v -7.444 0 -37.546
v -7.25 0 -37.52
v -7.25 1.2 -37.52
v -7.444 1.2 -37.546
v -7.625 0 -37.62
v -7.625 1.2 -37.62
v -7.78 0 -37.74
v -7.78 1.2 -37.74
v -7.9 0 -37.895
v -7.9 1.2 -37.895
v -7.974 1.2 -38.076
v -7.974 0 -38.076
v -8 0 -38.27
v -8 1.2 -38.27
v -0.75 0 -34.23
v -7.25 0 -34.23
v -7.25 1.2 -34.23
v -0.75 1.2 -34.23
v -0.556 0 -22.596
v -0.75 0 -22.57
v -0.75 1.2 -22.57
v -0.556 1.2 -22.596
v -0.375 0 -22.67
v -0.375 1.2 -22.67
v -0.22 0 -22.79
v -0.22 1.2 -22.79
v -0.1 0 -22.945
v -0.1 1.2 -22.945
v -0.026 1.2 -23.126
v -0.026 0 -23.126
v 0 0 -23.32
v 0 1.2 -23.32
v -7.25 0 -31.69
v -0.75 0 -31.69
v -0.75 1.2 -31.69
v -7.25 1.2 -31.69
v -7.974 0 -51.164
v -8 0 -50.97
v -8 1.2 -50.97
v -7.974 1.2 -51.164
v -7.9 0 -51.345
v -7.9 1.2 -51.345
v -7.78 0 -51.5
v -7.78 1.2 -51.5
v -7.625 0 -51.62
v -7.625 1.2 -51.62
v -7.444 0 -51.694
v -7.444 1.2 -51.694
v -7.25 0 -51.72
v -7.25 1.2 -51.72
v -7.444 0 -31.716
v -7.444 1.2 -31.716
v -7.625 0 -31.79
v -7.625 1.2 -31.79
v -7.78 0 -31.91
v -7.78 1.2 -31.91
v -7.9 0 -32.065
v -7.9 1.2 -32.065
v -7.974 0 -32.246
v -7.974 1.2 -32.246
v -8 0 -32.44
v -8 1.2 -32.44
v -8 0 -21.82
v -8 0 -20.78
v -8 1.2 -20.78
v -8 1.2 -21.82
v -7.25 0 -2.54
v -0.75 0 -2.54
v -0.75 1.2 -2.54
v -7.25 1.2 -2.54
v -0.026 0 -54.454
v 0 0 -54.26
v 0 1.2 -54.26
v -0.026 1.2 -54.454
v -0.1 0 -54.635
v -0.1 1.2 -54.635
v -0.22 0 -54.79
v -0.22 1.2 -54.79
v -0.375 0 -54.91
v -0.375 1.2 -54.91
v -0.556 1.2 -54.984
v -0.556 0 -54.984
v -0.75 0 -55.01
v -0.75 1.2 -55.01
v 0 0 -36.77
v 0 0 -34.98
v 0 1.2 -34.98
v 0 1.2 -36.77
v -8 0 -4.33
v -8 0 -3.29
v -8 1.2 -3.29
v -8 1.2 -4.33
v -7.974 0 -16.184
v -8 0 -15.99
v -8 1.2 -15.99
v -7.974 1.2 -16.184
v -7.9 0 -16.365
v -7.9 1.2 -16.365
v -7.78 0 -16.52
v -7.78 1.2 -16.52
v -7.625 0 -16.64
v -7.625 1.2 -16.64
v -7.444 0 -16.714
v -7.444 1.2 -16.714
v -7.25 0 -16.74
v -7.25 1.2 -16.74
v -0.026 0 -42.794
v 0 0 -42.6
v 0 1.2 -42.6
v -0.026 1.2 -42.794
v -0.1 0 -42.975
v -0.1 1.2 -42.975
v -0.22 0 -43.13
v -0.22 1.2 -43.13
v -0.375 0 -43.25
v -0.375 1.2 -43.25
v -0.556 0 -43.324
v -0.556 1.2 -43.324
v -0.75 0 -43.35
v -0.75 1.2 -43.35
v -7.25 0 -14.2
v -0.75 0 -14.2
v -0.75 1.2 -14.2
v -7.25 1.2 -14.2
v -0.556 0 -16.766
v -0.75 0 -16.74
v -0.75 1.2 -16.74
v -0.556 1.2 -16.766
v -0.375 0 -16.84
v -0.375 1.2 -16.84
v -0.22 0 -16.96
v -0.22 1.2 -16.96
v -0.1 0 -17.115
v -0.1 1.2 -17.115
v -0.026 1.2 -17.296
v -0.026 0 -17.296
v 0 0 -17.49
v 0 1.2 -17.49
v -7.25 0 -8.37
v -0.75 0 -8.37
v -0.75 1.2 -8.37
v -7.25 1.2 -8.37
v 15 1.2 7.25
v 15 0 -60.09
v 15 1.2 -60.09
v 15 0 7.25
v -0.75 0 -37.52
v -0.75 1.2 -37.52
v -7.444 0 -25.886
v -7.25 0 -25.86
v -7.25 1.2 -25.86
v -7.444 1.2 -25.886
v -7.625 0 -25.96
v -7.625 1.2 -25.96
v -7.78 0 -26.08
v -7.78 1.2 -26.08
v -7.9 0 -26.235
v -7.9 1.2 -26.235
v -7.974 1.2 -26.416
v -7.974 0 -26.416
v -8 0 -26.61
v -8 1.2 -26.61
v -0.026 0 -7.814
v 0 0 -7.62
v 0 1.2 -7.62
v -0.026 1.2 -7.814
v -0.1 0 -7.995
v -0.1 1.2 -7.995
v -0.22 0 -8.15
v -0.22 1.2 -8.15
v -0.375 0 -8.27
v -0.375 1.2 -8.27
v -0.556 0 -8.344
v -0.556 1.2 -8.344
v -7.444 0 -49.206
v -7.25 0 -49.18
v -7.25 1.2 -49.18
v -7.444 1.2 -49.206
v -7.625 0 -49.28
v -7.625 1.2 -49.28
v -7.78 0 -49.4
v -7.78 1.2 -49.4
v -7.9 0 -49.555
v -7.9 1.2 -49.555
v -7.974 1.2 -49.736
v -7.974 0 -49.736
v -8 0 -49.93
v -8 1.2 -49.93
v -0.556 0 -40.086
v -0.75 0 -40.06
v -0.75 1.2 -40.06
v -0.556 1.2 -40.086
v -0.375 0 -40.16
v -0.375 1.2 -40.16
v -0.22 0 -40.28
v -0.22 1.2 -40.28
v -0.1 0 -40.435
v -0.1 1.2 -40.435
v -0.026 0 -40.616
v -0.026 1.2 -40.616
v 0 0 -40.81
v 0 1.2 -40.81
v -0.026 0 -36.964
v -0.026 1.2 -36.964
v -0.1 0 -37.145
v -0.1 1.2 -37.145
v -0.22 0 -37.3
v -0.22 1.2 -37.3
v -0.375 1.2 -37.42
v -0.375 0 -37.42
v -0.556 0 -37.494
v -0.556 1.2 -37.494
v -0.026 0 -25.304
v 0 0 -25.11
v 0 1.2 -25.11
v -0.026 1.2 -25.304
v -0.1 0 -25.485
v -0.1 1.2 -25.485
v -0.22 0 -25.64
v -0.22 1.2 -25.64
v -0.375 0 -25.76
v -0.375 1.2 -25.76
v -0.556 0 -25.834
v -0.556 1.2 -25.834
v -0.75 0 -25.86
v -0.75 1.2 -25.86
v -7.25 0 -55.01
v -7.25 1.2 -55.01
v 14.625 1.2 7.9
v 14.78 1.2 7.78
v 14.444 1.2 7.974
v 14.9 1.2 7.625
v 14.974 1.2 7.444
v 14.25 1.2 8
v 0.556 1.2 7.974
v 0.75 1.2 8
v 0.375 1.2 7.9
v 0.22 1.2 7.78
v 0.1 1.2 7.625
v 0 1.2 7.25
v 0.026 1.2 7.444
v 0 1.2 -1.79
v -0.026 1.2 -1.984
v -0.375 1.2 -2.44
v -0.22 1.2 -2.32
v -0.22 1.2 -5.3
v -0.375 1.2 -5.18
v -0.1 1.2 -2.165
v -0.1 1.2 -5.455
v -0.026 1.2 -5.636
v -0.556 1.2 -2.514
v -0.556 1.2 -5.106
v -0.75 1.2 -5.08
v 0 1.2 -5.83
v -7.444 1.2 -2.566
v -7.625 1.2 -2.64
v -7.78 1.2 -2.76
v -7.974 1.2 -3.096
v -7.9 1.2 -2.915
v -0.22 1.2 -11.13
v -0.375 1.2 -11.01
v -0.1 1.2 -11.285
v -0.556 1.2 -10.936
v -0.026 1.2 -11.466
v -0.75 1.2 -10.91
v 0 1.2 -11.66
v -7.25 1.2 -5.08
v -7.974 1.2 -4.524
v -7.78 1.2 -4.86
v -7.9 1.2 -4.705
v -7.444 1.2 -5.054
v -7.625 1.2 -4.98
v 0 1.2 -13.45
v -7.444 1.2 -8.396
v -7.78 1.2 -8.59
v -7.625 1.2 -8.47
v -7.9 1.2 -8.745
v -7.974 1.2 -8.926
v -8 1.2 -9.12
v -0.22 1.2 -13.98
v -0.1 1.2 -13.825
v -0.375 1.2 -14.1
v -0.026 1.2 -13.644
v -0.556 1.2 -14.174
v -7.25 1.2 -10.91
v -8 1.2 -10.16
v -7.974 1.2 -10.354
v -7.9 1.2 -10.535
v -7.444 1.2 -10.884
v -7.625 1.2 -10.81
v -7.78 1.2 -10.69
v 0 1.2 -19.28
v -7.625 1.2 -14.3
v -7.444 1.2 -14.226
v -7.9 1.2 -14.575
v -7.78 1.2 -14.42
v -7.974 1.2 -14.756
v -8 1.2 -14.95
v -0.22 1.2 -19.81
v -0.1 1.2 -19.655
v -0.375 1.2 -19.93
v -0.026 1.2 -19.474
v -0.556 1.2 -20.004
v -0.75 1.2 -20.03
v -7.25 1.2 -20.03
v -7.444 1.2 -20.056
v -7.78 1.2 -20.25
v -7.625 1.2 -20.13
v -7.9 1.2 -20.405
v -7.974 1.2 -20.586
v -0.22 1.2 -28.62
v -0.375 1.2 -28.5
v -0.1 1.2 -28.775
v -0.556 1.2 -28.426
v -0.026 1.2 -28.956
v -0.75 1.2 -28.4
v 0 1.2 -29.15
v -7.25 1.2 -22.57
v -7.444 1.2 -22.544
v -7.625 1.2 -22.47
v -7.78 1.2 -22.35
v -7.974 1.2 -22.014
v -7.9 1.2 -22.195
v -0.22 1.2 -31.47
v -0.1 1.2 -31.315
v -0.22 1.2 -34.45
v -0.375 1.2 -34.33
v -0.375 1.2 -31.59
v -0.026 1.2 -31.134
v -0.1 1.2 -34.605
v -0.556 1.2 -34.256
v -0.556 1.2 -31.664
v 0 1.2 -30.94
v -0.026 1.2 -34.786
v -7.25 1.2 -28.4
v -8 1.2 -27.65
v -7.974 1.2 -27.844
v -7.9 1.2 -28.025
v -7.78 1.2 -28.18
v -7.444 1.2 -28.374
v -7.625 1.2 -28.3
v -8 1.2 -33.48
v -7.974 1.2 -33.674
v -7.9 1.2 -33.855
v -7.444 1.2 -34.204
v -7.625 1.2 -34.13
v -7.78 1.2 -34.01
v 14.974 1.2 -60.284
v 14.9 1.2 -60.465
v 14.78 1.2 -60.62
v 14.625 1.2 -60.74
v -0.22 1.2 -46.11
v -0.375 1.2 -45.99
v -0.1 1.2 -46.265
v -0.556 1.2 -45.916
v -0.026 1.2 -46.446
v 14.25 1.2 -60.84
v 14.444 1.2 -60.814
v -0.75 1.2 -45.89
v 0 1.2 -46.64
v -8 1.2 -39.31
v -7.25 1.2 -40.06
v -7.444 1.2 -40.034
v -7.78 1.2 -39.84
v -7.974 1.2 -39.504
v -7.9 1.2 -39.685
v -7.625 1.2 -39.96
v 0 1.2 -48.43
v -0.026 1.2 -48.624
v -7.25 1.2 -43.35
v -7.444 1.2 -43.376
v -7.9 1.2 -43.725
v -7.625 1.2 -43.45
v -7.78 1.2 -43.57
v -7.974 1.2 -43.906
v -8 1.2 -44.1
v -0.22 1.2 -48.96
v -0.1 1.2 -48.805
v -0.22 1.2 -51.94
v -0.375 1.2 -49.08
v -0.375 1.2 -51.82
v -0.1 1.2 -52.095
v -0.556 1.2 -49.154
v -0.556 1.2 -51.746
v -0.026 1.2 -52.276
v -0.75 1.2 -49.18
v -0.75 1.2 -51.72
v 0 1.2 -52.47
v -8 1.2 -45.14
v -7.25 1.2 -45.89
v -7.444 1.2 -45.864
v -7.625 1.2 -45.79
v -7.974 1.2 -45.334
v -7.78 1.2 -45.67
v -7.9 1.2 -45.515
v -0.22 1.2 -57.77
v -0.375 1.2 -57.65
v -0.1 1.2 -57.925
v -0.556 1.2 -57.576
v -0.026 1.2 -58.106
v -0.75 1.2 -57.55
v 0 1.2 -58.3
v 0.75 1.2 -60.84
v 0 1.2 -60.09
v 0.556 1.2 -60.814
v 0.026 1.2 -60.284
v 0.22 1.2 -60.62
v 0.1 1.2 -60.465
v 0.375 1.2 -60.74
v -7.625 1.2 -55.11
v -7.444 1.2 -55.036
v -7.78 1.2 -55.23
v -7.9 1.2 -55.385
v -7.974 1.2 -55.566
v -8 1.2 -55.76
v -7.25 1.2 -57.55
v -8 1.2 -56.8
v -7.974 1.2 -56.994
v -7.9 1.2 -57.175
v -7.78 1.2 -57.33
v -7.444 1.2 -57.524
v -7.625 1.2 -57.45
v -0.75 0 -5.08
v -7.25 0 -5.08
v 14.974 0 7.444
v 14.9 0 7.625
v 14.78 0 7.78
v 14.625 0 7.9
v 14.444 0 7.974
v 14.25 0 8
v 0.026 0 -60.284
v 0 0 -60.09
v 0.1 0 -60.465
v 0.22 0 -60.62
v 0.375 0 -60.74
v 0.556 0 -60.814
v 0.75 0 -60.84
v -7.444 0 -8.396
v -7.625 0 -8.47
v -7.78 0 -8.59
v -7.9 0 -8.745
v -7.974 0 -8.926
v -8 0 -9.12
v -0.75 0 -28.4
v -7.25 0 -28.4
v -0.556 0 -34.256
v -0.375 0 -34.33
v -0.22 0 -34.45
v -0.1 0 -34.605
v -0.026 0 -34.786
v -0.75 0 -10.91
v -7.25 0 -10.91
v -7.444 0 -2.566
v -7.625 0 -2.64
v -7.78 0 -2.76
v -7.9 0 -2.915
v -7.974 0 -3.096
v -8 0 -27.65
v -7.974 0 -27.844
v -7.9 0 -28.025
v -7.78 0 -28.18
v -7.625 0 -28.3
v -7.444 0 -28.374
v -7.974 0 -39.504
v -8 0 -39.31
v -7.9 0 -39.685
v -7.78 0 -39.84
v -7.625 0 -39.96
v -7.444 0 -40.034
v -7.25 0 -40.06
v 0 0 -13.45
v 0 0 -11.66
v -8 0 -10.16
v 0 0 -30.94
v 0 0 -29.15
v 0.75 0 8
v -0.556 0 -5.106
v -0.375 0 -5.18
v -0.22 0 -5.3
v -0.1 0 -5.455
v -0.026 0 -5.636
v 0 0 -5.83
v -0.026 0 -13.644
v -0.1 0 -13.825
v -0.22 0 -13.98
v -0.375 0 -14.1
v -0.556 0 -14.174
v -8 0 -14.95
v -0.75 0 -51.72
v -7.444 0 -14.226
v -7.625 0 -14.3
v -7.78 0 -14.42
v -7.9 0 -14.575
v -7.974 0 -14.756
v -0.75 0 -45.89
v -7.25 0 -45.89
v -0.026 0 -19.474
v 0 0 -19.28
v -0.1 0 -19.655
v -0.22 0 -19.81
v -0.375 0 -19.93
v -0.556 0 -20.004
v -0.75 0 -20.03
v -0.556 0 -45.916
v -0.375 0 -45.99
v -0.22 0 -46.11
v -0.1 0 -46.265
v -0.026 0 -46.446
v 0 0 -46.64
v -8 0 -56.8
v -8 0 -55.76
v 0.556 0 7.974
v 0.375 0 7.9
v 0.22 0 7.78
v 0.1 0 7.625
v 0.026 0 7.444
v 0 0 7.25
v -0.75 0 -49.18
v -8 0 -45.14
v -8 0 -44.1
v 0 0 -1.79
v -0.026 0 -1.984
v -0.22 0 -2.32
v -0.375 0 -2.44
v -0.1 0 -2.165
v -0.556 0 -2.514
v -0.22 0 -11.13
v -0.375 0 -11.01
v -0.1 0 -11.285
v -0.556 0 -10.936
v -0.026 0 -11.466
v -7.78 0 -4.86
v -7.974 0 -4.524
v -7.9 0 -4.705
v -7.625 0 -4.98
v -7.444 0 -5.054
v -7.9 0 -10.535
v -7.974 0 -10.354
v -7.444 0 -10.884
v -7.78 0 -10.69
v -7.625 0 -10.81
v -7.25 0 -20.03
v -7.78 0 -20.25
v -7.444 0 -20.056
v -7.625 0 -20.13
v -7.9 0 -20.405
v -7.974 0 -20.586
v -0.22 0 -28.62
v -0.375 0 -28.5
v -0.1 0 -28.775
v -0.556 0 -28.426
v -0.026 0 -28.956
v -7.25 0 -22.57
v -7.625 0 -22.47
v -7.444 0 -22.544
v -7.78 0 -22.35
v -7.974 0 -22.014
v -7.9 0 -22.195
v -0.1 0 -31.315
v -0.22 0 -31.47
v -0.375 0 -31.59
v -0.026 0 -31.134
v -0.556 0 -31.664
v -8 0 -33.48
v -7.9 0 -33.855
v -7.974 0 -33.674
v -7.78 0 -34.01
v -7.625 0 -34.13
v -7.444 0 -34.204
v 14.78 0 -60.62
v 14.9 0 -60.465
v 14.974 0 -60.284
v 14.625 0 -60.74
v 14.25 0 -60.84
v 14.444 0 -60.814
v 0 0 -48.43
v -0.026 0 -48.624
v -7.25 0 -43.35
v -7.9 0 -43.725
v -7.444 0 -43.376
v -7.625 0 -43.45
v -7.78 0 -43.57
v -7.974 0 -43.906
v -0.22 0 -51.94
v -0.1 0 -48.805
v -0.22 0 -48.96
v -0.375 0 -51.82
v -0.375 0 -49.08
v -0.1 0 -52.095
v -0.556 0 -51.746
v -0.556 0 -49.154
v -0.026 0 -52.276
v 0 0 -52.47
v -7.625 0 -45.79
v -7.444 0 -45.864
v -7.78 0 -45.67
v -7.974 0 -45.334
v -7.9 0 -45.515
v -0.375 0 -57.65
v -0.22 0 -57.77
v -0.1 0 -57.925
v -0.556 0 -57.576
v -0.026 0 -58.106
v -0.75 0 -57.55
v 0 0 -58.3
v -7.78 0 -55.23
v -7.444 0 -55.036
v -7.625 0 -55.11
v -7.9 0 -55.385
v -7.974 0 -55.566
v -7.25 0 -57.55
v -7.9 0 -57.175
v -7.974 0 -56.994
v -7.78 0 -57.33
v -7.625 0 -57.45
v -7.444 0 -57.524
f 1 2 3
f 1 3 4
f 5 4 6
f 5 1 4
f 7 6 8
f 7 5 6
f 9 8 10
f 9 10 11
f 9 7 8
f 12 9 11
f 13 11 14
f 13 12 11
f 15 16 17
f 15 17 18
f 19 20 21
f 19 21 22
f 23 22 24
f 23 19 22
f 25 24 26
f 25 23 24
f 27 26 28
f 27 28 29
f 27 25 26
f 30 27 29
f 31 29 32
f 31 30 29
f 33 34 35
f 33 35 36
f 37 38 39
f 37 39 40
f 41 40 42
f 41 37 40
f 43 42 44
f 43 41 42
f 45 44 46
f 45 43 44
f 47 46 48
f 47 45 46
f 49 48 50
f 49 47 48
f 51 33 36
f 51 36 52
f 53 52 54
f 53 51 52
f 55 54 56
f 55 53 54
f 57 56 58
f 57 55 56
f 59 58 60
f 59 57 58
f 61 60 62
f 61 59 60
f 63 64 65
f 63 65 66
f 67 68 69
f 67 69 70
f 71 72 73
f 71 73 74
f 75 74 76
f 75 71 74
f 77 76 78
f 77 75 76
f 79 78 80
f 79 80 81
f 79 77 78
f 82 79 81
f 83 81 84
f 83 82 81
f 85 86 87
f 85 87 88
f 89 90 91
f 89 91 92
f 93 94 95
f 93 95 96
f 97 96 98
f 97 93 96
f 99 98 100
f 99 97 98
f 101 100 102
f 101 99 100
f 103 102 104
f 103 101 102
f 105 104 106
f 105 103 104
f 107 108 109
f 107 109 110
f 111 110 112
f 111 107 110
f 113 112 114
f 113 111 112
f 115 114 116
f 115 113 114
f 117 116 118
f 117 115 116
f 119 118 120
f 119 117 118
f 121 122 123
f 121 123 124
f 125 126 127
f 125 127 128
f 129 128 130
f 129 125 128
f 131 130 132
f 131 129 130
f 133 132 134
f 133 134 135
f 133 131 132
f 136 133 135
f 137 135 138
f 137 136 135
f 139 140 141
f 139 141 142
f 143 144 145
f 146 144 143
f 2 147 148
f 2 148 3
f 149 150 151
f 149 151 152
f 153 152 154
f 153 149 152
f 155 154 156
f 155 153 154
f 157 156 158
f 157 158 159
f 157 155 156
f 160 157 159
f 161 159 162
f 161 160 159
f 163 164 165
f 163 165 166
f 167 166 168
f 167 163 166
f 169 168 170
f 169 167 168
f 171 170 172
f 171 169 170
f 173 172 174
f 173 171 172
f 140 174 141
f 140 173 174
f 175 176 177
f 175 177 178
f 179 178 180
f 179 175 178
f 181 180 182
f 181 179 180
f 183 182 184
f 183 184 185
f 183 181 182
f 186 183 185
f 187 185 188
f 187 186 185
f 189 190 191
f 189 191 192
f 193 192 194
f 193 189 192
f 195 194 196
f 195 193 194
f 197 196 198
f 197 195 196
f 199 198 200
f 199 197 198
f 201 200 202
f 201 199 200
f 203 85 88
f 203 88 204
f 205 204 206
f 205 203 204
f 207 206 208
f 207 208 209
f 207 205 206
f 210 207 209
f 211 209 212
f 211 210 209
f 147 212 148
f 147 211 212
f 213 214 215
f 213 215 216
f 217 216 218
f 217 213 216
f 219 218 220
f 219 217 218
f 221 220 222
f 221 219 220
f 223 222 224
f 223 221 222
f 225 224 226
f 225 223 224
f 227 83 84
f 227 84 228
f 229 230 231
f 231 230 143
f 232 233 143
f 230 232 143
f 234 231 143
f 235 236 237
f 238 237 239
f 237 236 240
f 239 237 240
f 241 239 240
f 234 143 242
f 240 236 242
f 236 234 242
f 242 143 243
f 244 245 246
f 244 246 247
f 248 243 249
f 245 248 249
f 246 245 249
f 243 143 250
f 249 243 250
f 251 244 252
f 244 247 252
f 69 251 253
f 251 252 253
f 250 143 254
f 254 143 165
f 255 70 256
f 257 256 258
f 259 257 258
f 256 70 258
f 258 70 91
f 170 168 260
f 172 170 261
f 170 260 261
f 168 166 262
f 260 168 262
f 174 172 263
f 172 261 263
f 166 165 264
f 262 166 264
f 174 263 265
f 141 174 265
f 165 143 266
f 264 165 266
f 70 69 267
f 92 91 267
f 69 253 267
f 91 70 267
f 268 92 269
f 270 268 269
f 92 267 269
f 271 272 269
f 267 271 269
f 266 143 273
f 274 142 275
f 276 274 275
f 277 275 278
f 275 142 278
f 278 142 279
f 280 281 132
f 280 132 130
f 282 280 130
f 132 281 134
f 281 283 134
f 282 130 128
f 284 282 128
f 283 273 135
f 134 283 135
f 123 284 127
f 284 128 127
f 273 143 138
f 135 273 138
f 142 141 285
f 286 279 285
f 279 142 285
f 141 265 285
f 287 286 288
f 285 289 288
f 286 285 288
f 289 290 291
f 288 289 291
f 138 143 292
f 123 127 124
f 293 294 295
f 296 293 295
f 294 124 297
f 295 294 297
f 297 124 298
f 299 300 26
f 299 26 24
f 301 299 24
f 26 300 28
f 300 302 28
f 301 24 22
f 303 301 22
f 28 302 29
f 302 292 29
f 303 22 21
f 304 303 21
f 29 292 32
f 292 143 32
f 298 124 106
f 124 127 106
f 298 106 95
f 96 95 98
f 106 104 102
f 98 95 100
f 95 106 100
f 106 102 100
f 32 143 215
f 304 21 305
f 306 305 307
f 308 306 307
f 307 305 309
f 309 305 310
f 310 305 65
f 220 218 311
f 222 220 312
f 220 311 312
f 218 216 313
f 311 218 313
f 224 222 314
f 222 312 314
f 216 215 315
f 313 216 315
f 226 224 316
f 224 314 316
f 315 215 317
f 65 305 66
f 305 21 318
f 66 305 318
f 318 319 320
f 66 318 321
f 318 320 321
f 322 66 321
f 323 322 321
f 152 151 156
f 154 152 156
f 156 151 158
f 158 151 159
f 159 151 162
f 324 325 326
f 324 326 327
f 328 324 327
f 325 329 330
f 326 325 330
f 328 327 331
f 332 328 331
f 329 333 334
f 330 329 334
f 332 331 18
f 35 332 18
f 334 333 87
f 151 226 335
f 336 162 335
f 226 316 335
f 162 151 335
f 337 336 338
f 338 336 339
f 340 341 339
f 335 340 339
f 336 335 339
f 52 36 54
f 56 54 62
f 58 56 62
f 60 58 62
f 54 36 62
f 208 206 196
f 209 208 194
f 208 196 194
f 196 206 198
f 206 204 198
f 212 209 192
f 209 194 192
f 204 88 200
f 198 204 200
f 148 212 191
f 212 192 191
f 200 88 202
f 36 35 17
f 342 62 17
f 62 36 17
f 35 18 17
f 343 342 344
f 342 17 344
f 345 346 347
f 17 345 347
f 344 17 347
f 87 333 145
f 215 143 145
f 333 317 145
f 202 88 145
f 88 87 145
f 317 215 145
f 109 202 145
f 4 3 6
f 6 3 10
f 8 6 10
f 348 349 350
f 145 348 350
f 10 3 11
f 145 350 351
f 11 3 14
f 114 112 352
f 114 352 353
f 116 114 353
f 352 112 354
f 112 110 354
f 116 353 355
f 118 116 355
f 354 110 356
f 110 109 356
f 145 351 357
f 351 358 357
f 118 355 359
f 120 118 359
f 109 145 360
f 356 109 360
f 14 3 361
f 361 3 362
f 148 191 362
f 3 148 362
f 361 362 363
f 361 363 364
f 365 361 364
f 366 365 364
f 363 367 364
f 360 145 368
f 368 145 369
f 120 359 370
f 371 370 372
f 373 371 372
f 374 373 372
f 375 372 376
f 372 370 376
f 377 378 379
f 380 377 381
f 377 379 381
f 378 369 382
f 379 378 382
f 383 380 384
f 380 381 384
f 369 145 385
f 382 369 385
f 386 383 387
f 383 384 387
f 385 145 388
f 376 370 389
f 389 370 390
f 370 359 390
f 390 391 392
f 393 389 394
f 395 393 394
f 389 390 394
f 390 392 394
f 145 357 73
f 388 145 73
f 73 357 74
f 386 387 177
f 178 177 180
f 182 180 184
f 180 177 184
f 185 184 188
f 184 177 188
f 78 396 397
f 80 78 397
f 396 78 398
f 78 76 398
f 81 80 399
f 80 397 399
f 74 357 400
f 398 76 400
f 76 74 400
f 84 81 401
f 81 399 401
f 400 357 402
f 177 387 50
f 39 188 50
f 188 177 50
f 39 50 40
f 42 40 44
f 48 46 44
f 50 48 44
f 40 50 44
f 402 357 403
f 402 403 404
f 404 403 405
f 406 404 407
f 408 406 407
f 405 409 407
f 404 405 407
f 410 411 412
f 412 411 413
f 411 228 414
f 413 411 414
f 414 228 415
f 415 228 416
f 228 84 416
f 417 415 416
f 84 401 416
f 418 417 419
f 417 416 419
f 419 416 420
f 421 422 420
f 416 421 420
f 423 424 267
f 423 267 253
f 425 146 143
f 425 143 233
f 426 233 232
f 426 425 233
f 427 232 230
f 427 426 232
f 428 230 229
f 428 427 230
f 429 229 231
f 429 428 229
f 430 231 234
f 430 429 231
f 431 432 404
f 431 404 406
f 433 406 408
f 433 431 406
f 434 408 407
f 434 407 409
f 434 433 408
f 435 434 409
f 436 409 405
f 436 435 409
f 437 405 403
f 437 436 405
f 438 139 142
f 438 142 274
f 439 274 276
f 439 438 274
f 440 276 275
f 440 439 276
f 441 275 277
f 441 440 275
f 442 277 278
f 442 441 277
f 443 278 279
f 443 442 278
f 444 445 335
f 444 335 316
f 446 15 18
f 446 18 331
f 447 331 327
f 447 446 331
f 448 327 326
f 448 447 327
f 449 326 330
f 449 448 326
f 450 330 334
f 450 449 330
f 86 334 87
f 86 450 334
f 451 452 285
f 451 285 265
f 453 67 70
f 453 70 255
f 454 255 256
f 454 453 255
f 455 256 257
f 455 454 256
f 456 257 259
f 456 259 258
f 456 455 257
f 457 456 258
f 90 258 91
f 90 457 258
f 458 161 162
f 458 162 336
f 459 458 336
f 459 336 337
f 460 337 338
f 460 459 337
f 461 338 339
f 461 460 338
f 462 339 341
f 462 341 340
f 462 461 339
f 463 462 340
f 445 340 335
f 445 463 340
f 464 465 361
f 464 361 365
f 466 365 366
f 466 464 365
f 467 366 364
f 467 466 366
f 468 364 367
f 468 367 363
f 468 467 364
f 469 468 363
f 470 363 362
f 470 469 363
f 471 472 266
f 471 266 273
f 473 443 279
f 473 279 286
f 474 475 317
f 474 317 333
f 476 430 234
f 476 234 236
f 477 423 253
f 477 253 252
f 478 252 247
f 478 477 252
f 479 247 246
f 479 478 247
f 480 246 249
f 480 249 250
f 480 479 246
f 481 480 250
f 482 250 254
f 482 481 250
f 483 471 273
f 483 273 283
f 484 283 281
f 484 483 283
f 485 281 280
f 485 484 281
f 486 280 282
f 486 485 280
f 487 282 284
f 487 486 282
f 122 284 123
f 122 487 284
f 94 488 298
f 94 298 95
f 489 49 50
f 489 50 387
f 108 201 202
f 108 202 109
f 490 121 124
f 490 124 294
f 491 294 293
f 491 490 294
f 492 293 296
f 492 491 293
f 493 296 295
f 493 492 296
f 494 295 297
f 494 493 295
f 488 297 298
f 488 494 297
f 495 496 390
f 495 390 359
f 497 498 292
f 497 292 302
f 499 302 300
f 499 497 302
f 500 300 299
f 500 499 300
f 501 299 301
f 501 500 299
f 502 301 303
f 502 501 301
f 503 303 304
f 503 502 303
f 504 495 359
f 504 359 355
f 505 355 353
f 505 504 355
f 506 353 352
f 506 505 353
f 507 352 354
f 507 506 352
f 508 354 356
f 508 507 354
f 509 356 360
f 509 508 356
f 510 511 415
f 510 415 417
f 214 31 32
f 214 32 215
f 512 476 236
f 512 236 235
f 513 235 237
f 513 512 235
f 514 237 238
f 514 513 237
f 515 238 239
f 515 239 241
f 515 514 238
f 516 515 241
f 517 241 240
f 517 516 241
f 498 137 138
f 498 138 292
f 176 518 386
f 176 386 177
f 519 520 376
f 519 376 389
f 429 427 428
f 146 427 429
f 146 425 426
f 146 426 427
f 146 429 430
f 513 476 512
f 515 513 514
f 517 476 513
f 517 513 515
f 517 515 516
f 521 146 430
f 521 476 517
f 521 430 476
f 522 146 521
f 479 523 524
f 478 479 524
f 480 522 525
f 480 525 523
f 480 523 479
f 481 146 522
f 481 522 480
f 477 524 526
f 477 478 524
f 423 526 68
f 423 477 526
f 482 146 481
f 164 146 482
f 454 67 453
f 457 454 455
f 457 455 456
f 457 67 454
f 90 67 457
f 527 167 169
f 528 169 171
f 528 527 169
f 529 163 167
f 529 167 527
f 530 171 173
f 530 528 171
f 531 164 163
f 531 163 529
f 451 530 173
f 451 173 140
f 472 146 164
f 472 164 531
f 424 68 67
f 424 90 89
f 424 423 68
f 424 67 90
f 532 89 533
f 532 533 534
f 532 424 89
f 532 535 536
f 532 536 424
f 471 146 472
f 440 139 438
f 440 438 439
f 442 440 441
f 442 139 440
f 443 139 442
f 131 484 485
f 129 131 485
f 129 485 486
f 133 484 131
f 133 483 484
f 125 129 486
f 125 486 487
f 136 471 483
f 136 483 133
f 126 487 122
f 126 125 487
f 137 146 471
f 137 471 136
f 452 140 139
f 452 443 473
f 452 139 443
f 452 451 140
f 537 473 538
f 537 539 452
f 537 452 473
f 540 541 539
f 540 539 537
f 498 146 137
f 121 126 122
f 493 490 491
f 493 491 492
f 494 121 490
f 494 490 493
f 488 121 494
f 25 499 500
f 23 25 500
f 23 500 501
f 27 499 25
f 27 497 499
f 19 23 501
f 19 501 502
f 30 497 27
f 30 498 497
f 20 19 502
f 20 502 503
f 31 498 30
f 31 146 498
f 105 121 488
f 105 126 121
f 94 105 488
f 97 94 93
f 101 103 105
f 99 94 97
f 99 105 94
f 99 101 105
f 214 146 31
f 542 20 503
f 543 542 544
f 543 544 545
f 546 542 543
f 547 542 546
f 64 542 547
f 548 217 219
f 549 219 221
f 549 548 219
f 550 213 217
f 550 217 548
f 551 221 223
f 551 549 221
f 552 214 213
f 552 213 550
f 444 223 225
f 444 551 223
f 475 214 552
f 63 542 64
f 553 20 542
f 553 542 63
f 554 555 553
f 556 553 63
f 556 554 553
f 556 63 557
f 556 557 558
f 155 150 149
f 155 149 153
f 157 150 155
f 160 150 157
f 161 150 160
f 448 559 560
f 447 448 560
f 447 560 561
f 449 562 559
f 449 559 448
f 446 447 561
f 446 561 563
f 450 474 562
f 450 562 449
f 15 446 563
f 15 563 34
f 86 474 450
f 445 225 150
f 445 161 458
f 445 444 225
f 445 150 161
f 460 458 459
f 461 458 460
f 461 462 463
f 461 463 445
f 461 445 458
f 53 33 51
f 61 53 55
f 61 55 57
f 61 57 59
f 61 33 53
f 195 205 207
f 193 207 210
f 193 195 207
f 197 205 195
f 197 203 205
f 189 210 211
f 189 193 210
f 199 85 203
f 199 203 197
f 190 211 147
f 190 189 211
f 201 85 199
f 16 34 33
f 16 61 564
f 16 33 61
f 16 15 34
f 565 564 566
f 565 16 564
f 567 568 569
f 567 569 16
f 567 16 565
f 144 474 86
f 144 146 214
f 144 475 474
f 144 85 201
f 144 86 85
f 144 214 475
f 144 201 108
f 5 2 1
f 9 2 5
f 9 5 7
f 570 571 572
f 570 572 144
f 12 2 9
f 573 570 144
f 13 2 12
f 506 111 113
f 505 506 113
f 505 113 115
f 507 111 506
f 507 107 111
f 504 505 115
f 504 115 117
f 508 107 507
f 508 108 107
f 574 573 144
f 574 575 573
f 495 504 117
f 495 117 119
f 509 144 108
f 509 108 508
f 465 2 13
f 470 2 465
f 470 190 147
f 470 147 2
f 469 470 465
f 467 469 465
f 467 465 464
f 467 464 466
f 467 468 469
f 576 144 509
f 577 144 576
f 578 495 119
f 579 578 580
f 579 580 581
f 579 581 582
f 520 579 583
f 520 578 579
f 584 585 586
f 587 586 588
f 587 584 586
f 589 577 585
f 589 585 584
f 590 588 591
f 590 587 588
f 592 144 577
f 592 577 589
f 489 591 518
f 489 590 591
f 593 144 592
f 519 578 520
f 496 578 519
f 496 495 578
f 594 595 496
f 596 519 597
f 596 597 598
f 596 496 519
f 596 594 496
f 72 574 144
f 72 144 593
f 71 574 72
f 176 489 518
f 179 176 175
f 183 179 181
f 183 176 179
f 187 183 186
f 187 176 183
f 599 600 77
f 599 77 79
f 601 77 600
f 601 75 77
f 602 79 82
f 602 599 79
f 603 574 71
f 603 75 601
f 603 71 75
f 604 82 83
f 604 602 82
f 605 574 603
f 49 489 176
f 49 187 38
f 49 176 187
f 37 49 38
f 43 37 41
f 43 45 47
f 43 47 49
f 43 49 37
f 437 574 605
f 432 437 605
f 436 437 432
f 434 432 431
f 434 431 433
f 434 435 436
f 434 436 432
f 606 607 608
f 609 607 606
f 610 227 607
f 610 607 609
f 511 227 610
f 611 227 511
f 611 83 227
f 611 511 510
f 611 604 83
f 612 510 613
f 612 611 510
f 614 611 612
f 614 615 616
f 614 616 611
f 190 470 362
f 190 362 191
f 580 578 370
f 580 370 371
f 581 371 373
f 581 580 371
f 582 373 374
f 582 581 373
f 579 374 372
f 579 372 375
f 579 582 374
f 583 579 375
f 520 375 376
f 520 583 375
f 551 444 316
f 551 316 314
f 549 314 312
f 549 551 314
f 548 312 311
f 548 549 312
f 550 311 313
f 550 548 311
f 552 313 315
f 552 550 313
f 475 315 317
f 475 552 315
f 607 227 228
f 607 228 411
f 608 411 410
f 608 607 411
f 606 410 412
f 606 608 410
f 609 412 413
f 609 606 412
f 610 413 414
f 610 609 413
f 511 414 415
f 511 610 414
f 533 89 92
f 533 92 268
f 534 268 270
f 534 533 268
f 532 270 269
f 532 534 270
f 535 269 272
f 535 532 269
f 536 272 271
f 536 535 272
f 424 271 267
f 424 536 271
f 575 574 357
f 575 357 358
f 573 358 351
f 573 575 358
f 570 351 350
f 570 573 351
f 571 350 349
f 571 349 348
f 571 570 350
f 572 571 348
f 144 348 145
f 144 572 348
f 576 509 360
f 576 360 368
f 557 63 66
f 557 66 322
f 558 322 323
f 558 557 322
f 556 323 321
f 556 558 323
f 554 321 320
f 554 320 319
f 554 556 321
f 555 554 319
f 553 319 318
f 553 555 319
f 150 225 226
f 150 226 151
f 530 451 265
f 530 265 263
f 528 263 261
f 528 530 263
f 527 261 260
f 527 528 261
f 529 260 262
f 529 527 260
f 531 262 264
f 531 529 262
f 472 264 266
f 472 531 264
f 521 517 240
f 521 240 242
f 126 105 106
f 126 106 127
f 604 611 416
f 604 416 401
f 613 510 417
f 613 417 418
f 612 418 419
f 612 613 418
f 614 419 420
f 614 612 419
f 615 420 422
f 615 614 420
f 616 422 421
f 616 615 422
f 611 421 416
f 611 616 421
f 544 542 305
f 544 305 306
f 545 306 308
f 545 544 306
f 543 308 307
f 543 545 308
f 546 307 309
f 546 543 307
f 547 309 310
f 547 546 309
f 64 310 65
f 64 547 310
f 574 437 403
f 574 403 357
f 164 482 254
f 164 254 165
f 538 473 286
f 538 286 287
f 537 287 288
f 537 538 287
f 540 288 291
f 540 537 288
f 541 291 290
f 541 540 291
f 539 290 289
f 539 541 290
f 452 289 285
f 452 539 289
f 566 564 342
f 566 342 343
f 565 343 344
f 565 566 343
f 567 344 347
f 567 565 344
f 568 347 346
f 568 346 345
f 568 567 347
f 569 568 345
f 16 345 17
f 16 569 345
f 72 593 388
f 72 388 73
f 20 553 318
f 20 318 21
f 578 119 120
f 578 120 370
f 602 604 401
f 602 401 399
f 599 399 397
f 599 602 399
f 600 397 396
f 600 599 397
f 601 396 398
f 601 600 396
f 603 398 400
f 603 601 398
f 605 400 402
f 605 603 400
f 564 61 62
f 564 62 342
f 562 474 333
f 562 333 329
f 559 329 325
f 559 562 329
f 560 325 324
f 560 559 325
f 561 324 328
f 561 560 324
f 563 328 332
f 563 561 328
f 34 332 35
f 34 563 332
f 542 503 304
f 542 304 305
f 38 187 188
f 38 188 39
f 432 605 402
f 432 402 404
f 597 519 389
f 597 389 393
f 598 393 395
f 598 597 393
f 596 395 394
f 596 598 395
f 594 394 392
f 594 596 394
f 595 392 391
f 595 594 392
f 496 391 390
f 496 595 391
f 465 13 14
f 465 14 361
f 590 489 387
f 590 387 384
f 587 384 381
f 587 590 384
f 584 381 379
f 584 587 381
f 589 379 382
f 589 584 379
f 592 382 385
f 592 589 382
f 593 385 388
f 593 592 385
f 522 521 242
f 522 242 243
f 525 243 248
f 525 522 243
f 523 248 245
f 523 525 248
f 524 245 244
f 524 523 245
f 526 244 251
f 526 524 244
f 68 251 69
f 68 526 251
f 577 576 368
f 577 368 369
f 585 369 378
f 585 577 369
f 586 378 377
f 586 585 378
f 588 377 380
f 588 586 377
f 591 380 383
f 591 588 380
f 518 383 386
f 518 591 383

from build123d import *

# Parameters (mm, degrees)
BOSS_EXTRUDE1_DEPTH = 1.2


with BuildPart() as part:
    # Sketch1 → Boss-Extrude1 (new body)
    with BuildSketch(Plane(origin=(0, 0, 0), x_dir=(1, 0, 0), z_dir=(0, 1, 0))):
        with BuildLine():
            Line((-0.75, 2.54), (-7.25, 2.54))
            ThreePointArc((-7.25, 2.54), (-7.780330086, 2.759669914), (-8, 3.29))
            Line((-8, 3.29), (-8, 4.33))
            ThreePointArc((-8, 4.33), (-7.780330086, 4.860330086), (-7.25, 5.08))
            Line((-7.25, 5.08), (-0.75, 5.08))
            ThreePointArc((-0.75, 5.08), (-0.219669914, 5.299669914), (0, 5.83))
            Line((0, 5.83), (0, 7.62000013))
            ThreePointArc((0, 7.62000013), (-0.219669914, 8.150330216), (-0.75, 8.37000013))
            Line((-0.75, 8.37000013), (-7.25, 8.37000013))
            ThreePointArc((-7.25, 8.37000013), (-7.780330086, 8.589670044), (-8, 9.12000013))
            Line((-8, 9.12000013), (-8, 10.16000013))
            ThreePointArc((-8, 10.16000013), (-7.780330086, 10.690330216), (-7.25, 10.91000013))
            Line((-7.25, 10.91000013), (-0.75, 10.91000013))
            ThreePointArc((-0.75, 10.91000013), (-0.219669868, 11.12967009), (0, 11.66000026))
            Line((0, 11.66000026), (0, 13.45000026))
            ThreePointArc((0, 13.45000026), (-0.219669914, 13.980330346), (-0.75, 14.20000026))
            Line((-0.75, 14.20000026), (-7.25, 14.20000026))
            ThreePointArc((-7.25, 14.20000026), (-7.780330086, 14.419670174), (-8, 14.95000026))
            Line((-8, 14.95000026), (-8, 15.99000026))
            ThreePointArc((-8, 15.99000026), (-7.780330086, 16.520330346), (-7.25, 16.74000026))
            Line((-7.25, 16.74000026), (-0.75, 16.74000026))
            ThreePointArc((-0.75, 16.74000026), (-0.219669868, 16.95967022), (0, 17.49000039))
            Line((0, 17.49000039), (0, 19.28000039))
            ThreePointArc((0, 19.28000039), (-0.219669914, 19.810330476), (-0.75, 20.03000039))
            Line((-0.75, 20.03000039), (-7.25, 20.03000039))
            ThreePointArc((-7.25, 20.03000039), (-7.780330086, 20.249670304), (-8, 20.78000039))
            Line((-8, 20.78000039), (-8, 21.82000039))
            ThreePointArc((-8, 21.82000039), (-7.780330086, 22.350330476), (-7.25, 22.57000039))
            Line((-7.25, 22.57000039), (-0.75, 22.57000039))
            ThreePointArc((-0.75, 22.57000039), (-0.219669868, 22.78967035), (0, 23.32000052))
            Line((0, 23.32000052), (0, 25.11000052))
            ThreePointArc((0, 25.11000052), (-0.219669914, 25.640330606), (-0.75, 25.86000052))
            Line((-0.75, 25.86000052), (-7.25, 25.86000052))
            ThreePointArc((-7.25, 25.86000052), (-7.780330086, 26.079670434), (-8, 26.61000052))
            Line((-8, 26.61000052), (-8, 27.65000052))
            ThreePointArc((-8, 27.65000052), (-7.780330086, 28.180330606), (-7.25, 28.40000052))
            Line((-7.25, 28.40000052), (-0.75, 28.40000052))
            ThreePointArc((-0.75, 28.40000052), (-0.219669868, 28.61967048), (0, 29.15000065))
            Line((0, 29.15000065), (0, 30.94000065))
            ThreePointArc((0, 30.94000065), (-0.219669914, 31.470330736), (-0.75, 31.69000065))
            Line((-0.75, 31.69000065), (-7.25, 31.69000065))
            ThreePointArc((-7.25, 31.69000065), (-7.780330086, 31.909670564), (-8, 32.44000065))
            Line((-8, 32.44000065), (-8, 33.48000065))
            ThreePointArc((-8, 33.48000065), (-7.780330086, 34.010330736), (-7.25, 34.23000065))
            Line((-7.25, 34.23000065), (-0.75, 34.23000065))
            ThreePointArc((-0.75, 34.23000065), (-0.219669868, 34.44967061), (0, 34.98000078))
            Line((0, 34.98000078), (0, 36.77000078))
            ThreePointArc((0, 36.77000078), (-0.219669914, 37.300330866), (-0.75, 37.52000078))
            Line((-0.75, 37.52000078), (-7.25, 37.52000078))
            ThreePointArc((-7.25, 37.52000078), (-7.780330086, 37.739670694), (-8, 38.27000078))
            Line((-8, 38.27000078), (-8, 39.31000078))
            ThreePointArc((-8, 39.31000078), (-7.780330086, 39.840330866), (-7.25, 40.06000078))
            Line((-7.25, 40.06000078), (-0.75, 40.06000078))
            ThreePointArc((-0.75, 40.06000078), (-0.219669868, 40.27967074), (0, 40.81000091))
            Line((0, 40.81000091), (0, 42.60000091))
            ThreePointArc((0, 42.60000091), (-0.219669914, 43.130330995), (-0.75, 43.35000091))
            Line((-0.75, 43.35000091), (-7.25, 43.35000091))
            ThreePointArc((-7.25, 43.35000091), (-7.780330086, 43.569670824), (-8, 44.10000091))
            Line((-8, 44.10000091), (-8, 45.14000091))
            ThreePointArc((-8, 45.14000091), (-7.780330086, 45.670330995), (-7.25, 45.89000091))
            Line((-7.25, 45.89000091), (-0.75, 45.89000091))
            ThreePointArc((-0.75, 45.89000091), (-0.219669868, 46.10967087), (0, 46.64000104))
            Line((0, 46.64000104), (0, 48.43000104))
            ThreePointArc((0, 48.43000104), (-0.219669914, 48.960331125), (-0.75, 49.18000104))
            Line((-0.75, 49.18000104), (-7.25, 49.18000104))
            ThreePointArc((-7.25, 49.18000104), (-7.780330086, 49.399670954), (-8, 49.93000104))
            Line((-8, 49.93000104), (-8, 50.97000104))
            ThreePointArc((-8, 50.97000104), (-7.780330086, 51.500331125), (-7.25, 51.72000104))
            Line((-7.25, 51.72000104), (-0.75, 51.72000104))
            ThreePointArc((-0.75, 51.72000104), (-0.219669868, 51.939671), (0, 52.470001169))
            Line((0, 52.470001169), (0, 54.260001169))
            ThreePointArc((0, 54.260001169), (-0.219669914, 54.790331255), (-0.75, 55.010001169))
            Line((-0.75, 55.010001169), (-7.25, 55.010001169))
            ThreePointArc((-7.25, 55.010001169), (-7.780330086, 55.229671084), (-8, 55.760001169))
            Line((-8, 55.760001169), (-8, 56.800001169))
            ThreePointArc((-8, 56.800001169), (-7.780330086, 57.330331255), (-7.25, 57.550001169))
            Line((-7.25, 57.550001169), (-0.75, 57.550001169))
            ThreePointArc((-0.75, 57.550001169), (-0.219669914, 57.769671084), (0, 58.300001169))
            Line((0, 58.300001169), (0, 60.090001169))
            ThreePointArc((0, 60.090001169), (0.219669914, 60.620331255), (0.75, 60.840001169))
            Line((0.75, 60.840001169), (14.25, 60.840001169))
            ThreePointArc((14.25, 60.840001169), (14.780330086, 60.620331255), (15, 60.090001169))
            Line((15, 60.090001169), (15, 0))
            Line((15, 0), (15, -7.25))
            ThreePointArc((15, -7.25), (14.780330086, -7.780330086), (14.25, -8))
            Line((14.25, -8), (0.75, -8))
            ThreePointArc((0.75, -8), (0.219669914, -7.780330086), (0, -7.25))
            Line((0, -7.25), (0, 0))
            Line((0, 0), (0, 1.79))
            ThreePointArc((0, 1.79), (-0.219669914, 2.320330086), (-0.75, 2.54))
        make_face()
    extrude(amount=BOSS_EXTRUDE1_DEPTH)


solid = part.part
